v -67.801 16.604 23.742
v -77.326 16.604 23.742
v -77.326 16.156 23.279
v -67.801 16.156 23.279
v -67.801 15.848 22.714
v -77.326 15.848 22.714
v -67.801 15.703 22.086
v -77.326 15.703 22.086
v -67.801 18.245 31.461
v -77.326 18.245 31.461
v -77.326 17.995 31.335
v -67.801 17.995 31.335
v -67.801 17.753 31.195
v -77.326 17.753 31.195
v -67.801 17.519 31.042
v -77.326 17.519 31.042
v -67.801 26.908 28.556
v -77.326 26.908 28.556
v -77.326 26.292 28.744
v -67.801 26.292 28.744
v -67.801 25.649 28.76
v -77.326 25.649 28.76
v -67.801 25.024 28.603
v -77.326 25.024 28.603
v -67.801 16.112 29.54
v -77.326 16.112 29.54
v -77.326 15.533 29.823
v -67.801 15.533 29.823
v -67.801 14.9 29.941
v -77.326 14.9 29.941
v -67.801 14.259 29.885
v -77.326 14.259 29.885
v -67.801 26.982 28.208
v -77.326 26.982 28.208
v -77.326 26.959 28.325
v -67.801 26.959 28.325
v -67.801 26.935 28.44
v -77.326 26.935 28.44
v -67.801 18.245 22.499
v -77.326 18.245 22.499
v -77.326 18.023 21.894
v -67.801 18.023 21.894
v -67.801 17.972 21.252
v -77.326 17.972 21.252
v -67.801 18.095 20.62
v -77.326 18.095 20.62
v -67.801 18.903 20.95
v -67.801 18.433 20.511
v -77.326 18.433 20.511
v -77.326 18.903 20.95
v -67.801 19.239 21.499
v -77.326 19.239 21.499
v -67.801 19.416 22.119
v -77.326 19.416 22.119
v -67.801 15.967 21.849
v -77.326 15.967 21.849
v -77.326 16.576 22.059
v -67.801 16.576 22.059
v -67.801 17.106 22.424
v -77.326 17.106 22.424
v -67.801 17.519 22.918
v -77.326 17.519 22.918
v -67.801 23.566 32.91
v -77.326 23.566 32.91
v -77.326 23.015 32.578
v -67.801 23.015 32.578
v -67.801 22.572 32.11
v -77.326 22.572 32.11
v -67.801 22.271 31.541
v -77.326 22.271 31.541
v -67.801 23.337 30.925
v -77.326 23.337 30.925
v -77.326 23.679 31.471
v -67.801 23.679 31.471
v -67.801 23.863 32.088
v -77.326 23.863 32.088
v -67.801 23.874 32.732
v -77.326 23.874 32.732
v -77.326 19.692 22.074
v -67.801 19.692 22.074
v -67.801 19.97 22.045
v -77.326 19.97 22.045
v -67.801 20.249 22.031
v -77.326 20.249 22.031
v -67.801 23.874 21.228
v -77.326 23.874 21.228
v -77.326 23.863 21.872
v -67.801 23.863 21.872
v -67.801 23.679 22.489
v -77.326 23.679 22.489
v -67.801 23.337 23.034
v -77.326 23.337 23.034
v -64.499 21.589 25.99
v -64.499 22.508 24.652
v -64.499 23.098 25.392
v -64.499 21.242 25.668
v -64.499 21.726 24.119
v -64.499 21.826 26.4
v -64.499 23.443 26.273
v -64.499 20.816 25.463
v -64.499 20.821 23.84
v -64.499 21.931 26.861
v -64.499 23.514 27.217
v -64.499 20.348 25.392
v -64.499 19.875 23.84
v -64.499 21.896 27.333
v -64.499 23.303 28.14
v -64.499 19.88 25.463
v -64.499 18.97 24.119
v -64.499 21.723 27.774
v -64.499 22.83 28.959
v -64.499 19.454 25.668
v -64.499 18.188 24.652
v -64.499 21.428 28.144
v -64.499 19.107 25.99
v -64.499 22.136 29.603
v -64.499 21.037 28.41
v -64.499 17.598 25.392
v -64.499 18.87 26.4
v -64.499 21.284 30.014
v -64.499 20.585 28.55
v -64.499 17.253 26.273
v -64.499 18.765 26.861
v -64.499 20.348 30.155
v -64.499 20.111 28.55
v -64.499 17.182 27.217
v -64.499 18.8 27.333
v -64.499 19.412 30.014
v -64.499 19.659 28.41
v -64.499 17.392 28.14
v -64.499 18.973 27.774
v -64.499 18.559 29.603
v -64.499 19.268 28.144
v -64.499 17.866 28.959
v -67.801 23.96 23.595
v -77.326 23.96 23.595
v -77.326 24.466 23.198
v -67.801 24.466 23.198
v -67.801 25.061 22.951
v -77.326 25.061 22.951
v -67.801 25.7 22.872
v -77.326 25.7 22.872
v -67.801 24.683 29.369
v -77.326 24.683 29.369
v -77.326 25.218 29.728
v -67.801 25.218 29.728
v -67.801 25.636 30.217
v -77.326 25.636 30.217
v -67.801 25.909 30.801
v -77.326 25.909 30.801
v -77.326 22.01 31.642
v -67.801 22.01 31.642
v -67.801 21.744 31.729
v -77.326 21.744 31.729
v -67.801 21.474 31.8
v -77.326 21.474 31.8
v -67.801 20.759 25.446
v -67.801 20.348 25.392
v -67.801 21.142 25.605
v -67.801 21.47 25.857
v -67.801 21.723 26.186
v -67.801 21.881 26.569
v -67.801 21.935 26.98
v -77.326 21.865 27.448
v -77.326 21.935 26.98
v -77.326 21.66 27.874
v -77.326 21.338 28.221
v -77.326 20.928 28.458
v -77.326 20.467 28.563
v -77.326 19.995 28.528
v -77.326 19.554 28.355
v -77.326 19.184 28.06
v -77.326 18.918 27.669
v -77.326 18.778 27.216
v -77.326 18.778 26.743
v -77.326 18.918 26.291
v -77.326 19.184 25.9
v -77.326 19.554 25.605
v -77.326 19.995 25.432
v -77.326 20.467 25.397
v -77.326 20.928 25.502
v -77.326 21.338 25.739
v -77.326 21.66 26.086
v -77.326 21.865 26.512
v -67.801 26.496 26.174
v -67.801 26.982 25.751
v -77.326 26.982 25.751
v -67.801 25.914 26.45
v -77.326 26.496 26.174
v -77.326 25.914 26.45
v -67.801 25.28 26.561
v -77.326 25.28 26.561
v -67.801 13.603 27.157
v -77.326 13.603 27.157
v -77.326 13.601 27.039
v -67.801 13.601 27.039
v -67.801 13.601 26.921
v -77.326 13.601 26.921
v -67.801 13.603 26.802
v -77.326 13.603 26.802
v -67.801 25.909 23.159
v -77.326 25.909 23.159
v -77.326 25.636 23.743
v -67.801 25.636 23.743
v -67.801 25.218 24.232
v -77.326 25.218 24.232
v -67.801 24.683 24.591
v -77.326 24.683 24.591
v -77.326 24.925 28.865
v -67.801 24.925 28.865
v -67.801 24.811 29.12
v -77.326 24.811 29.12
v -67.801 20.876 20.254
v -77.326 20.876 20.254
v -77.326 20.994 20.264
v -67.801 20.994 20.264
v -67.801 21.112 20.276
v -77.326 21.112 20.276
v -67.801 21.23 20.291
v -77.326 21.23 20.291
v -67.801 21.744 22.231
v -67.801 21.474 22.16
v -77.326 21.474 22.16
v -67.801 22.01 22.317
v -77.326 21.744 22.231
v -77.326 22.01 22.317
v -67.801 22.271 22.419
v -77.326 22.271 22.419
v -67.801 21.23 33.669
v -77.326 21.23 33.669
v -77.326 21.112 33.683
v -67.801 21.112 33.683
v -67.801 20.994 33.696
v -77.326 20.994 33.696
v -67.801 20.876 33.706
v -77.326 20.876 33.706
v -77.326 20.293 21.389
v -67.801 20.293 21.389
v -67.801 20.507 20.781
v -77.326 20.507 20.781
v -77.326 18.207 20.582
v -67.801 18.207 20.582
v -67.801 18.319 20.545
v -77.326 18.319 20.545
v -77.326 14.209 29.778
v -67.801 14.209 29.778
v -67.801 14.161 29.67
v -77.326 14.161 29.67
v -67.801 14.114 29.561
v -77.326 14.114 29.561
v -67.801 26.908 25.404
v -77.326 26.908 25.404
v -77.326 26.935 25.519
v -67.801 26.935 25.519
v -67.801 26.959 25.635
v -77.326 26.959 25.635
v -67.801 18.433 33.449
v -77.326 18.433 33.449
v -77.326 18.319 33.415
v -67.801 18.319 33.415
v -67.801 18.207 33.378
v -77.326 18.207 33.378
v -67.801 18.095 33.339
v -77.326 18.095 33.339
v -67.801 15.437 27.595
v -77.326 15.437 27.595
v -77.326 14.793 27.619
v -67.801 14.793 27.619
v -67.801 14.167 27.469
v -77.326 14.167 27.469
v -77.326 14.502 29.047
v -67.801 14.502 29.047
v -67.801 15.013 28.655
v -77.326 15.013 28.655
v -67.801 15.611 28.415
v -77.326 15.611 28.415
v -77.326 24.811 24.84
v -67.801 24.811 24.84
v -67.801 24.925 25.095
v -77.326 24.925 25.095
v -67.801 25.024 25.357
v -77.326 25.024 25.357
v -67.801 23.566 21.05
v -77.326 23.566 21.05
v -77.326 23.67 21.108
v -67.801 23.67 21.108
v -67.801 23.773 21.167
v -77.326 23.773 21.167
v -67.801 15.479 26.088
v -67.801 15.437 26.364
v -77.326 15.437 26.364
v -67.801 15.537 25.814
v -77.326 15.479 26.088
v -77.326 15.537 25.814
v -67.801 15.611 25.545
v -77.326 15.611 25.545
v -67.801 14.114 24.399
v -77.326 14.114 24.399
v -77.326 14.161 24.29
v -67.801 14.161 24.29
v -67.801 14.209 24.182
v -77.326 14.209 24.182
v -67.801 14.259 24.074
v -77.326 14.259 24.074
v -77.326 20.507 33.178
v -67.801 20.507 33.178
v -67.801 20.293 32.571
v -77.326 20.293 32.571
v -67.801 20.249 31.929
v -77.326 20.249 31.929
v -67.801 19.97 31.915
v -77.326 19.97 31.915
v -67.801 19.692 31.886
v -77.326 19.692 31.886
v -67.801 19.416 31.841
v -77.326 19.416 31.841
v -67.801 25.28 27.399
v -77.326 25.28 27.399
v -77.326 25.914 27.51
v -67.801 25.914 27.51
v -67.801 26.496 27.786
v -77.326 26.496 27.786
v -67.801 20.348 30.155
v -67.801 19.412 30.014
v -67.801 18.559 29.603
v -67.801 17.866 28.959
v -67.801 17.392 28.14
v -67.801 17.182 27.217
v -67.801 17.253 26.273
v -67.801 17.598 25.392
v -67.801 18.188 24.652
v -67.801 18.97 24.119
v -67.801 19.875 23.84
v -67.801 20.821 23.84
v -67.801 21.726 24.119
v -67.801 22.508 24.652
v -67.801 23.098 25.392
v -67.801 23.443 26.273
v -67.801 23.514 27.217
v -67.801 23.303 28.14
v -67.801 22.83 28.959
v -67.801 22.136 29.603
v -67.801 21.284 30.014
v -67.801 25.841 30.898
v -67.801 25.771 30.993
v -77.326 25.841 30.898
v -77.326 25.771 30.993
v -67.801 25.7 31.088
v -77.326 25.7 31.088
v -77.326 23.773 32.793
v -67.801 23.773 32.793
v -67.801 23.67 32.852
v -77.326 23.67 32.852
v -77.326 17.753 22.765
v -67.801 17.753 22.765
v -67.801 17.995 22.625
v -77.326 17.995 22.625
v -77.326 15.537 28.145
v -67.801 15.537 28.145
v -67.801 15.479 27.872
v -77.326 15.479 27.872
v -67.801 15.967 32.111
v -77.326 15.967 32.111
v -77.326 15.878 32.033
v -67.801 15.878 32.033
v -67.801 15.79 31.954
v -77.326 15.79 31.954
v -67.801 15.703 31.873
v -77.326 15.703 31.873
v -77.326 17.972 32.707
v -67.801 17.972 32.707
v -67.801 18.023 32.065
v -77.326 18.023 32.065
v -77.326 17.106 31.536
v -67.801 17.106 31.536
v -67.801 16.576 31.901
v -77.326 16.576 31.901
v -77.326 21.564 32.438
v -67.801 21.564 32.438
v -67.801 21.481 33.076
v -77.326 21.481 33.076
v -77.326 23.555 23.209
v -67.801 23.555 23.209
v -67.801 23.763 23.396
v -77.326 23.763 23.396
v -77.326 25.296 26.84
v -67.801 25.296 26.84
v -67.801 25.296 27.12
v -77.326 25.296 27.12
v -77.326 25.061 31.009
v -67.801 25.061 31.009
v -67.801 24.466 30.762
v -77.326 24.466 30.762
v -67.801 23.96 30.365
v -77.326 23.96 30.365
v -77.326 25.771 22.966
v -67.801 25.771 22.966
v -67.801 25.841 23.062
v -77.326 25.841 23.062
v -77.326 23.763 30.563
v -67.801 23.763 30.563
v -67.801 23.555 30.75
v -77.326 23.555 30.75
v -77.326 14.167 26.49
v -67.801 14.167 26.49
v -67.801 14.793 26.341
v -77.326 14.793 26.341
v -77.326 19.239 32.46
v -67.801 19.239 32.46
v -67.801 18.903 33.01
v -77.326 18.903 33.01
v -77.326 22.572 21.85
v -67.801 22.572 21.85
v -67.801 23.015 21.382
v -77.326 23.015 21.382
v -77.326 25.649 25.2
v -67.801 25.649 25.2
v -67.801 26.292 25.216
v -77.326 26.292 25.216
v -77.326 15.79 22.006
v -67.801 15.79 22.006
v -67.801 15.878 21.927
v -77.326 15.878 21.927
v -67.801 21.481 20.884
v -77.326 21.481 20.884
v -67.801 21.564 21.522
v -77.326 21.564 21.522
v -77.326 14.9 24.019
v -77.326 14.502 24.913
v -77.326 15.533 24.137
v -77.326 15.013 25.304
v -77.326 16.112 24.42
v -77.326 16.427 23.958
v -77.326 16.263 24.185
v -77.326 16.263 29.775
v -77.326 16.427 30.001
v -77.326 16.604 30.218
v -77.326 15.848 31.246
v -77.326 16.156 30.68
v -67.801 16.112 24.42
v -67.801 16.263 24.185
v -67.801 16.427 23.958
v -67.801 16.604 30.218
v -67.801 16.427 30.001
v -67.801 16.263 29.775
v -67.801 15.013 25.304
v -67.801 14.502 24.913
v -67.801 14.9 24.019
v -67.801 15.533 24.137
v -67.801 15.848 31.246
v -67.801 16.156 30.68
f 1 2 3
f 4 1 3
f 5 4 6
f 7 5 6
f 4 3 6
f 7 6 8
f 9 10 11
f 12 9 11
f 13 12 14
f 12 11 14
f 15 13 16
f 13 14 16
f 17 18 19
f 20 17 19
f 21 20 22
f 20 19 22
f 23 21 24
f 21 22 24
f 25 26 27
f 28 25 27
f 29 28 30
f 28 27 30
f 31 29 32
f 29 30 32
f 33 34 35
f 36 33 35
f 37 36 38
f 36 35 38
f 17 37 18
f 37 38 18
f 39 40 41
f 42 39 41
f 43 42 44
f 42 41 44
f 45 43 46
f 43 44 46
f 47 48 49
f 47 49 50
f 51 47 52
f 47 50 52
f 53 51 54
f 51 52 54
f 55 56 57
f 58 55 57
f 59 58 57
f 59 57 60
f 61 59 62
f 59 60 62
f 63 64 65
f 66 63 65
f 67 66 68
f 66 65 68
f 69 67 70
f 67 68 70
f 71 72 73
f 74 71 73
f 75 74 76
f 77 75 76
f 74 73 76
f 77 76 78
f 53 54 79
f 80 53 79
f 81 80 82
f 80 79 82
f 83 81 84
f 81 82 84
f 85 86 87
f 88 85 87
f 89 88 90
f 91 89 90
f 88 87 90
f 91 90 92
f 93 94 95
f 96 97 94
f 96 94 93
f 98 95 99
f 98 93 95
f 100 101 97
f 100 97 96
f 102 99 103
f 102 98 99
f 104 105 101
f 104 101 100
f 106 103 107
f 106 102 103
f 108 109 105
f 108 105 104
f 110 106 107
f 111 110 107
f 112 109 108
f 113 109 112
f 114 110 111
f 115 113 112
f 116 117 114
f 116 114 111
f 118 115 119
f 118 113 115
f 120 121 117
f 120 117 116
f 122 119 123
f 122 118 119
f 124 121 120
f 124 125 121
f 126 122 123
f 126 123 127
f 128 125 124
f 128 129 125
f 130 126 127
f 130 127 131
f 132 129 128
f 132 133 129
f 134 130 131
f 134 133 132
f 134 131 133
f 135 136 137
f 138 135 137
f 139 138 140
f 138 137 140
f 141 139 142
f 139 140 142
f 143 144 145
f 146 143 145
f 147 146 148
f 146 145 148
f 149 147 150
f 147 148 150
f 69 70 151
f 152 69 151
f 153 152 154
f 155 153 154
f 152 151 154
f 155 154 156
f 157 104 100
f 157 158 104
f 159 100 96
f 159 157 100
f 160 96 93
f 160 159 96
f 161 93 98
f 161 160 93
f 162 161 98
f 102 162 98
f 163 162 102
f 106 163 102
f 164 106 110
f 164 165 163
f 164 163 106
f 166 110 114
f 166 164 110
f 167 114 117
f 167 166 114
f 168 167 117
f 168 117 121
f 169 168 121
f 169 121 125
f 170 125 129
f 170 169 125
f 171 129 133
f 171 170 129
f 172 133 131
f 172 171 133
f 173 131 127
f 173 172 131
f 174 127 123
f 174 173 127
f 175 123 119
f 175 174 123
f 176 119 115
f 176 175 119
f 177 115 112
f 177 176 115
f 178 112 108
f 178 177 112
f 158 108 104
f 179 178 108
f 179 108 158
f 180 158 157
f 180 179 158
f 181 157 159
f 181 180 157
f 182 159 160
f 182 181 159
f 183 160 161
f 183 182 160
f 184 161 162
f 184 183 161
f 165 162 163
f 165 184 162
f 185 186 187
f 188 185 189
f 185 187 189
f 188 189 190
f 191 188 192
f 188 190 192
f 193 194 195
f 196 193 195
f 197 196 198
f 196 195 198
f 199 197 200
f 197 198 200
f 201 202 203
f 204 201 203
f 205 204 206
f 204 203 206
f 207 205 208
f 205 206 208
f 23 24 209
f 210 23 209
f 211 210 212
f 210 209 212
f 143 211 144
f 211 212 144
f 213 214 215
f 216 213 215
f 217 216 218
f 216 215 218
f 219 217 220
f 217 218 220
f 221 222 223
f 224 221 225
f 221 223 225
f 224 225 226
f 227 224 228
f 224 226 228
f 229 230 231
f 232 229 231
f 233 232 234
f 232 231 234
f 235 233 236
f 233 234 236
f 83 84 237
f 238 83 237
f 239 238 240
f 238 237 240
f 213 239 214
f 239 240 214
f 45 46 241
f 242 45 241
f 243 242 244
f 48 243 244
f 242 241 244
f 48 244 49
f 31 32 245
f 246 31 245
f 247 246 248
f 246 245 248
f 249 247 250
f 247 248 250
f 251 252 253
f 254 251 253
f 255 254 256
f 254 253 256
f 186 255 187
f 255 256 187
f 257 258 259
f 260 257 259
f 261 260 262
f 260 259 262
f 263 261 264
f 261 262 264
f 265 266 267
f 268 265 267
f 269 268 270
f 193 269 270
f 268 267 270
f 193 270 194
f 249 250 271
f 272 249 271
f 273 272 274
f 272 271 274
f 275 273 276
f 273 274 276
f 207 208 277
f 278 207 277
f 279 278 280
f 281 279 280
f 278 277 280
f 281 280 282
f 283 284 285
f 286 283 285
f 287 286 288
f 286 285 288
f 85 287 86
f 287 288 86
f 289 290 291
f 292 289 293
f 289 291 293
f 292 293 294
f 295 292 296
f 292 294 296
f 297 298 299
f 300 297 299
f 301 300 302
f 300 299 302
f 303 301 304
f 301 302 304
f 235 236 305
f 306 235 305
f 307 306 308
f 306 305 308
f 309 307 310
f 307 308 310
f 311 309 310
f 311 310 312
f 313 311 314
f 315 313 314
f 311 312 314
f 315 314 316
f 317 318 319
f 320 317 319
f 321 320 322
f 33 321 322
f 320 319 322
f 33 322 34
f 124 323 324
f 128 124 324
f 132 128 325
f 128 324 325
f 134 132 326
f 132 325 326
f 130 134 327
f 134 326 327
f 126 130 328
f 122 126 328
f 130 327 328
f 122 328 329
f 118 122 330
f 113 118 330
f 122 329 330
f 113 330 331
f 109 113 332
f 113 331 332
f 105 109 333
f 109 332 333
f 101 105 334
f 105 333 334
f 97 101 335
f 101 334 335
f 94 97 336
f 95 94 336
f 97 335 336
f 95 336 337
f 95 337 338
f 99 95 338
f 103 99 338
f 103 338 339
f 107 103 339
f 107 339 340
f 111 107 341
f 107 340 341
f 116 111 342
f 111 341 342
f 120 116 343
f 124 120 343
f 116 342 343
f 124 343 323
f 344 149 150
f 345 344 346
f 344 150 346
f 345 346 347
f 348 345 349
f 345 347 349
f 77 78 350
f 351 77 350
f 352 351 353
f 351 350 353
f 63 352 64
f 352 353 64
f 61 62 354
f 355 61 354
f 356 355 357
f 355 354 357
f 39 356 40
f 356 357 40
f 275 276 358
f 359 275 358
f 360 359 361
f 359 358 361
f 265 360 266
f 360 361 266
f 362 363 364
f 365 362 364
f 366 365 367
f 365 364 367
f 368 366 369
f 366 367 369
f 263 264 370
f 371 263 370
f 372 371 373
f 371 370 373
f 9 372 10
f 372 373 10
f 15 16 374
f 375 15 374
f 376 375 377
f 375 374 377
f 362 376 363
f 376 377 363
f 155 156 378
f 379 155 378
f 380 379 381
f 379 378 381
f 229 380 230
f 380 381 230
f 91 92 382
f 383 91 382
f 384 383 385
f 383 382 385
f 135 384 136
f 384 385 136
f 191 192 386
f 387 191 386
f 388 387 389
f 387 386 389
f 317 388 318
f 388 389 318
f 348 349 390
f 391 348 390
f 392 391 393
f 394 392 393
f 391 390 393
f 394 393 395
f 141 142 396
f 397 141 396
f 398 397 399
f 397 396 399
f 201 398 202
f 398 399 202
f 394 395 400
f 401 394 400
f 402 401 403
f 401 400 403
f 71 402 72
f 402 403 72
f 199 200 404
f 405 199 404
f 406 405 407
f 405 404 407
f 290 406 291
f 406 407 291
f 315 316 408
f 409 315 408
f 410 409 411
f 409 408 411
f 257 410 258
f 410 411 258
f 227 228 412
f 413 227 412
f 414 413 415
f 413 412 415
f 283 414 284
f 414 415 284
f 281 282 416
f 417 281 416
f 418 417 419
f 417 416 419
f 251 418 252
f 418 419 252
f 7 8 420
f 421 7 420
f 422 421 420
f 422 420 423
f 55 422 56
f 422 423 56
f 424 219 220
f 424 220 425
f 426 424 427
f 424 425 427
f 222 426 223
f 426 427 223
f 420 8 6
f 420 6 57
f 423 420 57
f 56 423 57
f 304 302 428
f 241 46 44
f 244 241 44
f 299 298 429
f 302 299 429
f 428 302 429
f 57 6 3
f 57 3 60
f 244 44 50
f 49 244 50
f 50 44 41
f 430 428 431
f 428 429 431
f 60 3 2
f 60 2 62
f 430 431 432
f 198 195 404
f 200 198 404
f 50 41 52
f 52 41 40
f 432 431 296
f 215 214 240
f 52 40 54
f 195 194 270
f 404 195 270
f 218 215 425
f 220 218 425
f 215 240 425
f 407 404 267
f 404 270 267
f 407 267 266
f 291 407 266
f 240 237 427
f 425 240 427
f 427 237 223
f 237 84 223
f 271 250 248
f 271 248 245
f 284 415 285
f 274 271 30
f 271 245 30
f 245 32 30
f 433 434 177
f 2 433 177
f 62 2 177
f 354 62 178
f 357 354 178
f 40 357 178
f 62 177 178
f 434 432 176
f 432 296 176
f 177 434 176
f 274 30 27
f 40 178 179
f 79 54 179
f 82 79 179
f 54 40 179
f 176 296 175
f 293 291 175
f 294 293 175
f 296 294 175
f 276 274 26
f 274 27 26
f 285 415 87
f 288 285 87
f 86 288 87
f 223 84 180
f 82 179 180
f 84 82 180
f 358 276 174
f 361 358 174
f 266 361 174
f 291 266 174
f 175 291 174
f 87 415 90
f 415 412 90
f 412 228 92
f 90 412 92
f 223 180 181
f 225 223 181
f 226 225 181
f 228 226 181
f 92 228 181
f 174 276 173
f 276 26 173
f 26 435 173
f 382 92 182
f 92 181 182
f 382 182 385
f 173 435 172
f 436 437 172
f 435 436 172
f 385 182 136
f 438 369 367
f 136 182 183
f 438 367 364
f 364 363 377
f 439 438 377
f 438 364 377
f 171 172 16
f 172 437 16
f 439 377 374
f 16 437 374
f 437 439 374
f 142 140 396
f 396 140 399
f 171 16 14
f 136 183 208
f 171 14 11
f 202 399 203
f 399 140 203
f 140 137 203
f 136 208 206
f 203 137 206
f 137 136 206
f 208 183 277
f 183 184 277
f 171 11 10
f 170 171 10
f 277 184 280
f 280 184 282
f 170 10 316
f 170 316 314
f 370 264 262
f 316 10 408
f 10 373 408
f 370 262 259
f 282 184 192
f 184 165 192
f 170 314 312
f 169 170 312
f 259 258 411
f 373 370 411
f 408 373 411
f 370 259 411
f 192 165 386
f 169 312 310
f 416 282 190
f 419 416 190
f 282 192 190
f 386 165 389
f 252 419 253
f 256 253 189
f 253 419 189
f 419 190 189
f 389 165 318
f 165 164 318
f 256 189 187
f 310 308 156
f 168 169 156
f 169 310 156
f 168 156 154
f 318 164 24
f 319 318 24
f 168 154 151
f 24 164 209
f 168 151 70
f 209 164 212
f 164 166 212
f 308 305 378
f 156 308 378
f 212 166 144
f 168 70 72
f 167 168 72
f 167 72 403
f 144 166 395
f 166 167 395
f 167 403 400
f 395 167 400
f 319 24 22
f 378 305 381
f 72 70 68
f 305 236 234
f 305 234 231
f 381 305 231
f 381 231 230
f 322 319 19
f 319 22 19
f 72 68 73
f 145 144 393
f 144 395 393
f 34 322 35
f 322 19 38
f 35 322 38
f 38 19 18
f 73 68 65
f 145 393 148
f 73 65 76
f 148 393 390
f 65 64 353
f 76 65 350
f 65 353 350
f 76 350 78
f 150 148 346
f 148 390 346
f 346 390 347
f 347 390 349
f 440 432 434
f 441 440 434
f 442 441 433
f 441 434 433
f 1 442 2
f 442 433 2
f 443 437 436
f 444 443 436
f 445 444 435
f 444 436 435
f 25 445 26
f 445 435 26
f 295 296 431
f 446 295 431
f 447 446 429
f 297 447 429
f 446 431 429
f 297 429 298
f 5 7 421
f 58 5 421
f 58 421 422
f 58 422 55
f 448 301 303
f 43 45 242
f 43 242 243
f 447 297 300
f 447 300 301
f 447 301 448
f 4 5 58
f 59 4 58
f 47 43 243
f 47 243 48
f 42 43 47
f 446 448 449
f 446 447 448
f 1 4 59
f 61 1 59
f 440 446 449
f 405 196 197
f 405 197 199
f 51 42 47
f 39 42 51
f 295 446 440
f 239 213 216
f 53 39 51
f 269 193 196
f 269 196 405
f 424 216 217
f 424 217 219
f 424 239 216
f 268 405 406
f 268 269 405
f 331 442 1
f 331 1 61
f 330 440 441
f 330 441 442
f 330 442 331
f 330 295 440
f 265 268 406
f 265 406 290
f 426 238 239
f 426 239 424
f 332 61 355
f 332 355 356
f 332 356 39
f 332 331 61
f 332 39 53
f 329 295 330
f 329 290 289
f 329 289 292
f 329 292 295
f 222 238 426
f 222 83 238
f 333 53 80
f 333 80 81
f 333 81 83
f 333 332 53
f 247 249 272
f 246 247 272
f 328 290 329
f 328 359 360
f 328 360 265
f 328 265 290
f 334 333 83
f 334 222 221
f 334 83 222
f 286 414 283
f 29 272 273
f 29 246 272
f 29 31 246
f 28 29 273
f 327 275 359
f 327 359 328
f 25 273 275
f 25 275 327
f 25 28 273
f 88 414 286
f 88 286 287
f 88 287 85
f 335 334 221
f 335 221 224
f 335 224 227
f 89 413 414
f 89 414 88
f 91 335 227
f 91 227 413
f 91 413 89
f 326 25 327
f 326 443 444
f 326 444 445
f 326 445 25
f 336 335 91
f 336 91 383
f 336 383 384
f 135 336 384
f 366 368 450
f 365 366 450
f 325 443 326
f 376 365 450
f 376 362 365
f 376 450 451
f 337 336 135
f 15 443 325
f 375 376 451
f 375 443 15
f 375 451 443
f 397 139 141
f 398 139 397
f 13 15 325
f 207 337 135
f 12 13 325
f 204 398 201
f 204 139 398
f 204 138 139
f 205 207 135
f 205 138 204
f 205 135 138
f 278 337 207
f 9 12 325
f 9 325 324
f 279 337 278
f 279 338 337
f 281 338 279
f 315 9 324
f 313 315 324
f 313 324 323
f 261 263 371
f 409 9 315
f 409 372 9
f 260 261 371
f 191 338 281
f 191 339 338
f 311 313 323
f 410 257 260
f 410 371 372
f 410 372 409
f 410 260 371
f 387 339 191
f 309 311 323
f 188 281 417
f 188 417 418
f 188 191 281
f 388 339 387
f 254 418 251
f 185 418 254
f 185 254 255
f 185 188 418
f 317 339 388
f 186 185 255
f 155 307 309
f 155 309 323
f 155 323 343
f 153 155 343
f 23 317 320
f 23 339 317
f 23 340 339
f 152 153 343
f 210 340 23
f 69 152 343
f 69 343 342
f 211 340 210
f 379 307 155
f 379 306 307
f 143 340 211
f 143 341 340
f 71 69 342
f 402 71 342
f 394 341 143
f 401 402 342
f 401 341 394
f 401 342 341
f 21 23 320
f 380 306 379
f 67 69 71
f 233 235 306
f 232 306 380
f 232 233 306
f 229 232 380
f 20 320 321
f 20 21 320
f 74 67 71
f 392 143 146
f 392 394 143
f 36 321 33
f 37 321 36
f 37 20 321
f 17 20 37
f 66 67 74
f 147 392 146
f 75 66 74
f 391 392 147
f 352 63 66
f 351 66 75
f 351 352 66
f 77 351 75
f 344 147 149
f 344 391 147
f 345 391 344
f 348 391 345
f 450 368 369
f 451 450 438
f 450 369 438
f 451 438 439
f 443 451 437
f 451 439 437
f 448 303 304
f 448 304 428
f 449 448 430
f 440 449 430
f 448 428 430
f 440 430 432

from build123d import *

# Parameters (mm, degrees)
SPUR_START             = -77.326171545
SPUR_GEAR_AI_OUTLINE_R = 1.5875
SPUR_GEAR_AI_DEPTH     = 9.525
SKETCH1_R              = 3.175
SKETCH1_R_2            = 1.5875
BOSS_EXTRUDE1_DEPTH    = 3.302


# Read off the part's stored shape, not the designer's step: spur gear_ai
with BuildPart() as part:
    # spur gear_ai outline → spur gear_ai (new body)
    with BuildSketch(Plane.YZ.offset(SPUR_START)):
        with BuildLine():
            ThreePointArc((25.700043696, 22.871890839), (25.806291245, 23.014153087), (25.908758385, 23.159161964))
            ThreePointArc((25.908758385, 23.159161964), (25.44365934, 24.001503635), (24.683177407, 24.591015164))
            ThreePointArc((24.683177407, 24.591015164), (24.869844856, 24.966591507), (25.024047568, 25.356622082))
            ThreePointArc((25.024047568, 25.356622082), (25.971001747, 25.185934076), (26.908195608, 25.40393472))
            ThreePointArc((26.908195608, 25.40393472), (26.947394305, 25.577112523), (26.982022272, 25.751261864))
            ThreePointArc((26.982022272, 25.751261864), (26.214521927, 26.331606447), (25.280011171, 26.560836158))
            ThreePointArc((25.280011171, 26.560836158), (25.297779711, 26.979866711), (25.280011171, 27.398897265))
            ThreePointArc((25.280011171, 27.398897265), (26.214521927, 27.628126976), (26.982022272, 28.208471559))
            ThreePointArc((26.982022272, 28.208471559), (26.947394305, 28.3826209), (26.908195608, 28.555798703))
            ThreePointArc((26.908195608, 28.555798703), (25.971001747, 28.773799347), (25.024047568, 28.60311134))
            ThreePointArc((25.024047568, 28.60311134), (24.869844856, 28.993141915), (24.683177407, 29.368718258))
            ThreePointArc((24.683177407, 29.368718258), (25.44365934, 29.958229787), (25.908758385, 30.800571458))
            ThreePointArc((25.908758385, 30.800571458), (25.806291245, 30.945580335), (25.700043696, 31.087842584))
            ThreePointArc((25.700043696, 31.087842584), (24.755205651, 30.905804997), (23.959545029, 30.36471278))
            ThreePointArc((23.959545029, 30.36471278), (23.660034115, 30.658303547), (23.336744253, 30.925485117))
            ThreePointArc((23.336744253, 30.925485117), (23.791703129, 31.773346565), (23.873981026, 32.732036797))
            ThreePointArc((23.873981026, 32.732036797), (23.721392211, 32.822831857), (23.566466975, 32.909580117))
            ThreePointArc((23.566466975, 32.909580117), (22.777355829, 32.358980252), (22.270565713, 31.541043584))
            ThreePointArc((22.270565713, 31.541043584), (21.877534755, 31.687430032), (21.473522236, 31.800018709))
            ThreePointArc((21.473522236, 31.800018709), (21.544291531, 32.759627129), (21.229521683, 33.668899671))
            ThreePointArc((21.229521683, 33.668899671), (21.053195187, 33.689781624), (20.876380246, 33.706016332))
            ThreePointArc((20.876380246, 33.706016332), (20.379440483, 32.882057908), (20.249149489, 31.92870547))
            ThreePointArc((20.249149489, 31.92870547), (19.83055711, 31.902576052), (19.415679368, 31.84110423))
            ThreePointArc((19.415679368, 31.84110423), (19.090022428, 32.746534609), (18.432631403, 33.449167979))
            ThreePointArc((18.432631403, 33.449167979), (18.263055677, 33.396526145), (18.09492394, 33.339440173))
            ThreePointArc((18.09492394, 33.339440173), (17.976080961, 32.384593086), (18.244817586, 31.460668176))
            ThreePointArc((18.244817586, 31.460668176), (17.873042211, 31.266540906), (17.519035377, 31.041637622))
            ThreePointArc((17.519035377, 31.041637622), (16.853261246, 31.736332821), (15.966917922, 32.110835325))
            ThreePointArc((15.966917922, 32.110835325), (15.833414151, 31.993771955), (15.703037123, 31.873235987))
            ThreePointArc((15.703037123, 31.873235987), (15.982839958, 30.952601973), (16.604137198, 30.217859601))
            ThreePointArc((16.604137198, 30.217859601), (16.343462167, 29.889300848), (16.111537238, 29.539853923))
            ThreePointArc((16.111537238, 29.539853923), (15.220764312, 29.903694832), (14.258725503, 29.885311585))
            ThreePointArc((14.258725503, 29.885311585), (14.184377702, 29.724068), (14.114298755, 29.560923799))
            ThreePointArc((14.114298755, 29.560923799), (14.744366952, 28.833688843), (15.610796869, 28.41517264))
            ThreePointArc((15.610796869, 28.41517264), (15.506295264, 28.008993196), (15.436554167, 27.595425178))
            ThreePointArc((15.436554167, 27.595425178), (14.474805177, 27.565500398), (13.603416133, 27.157410031))
            ThreePointArc((13.603416133, 27.157410031), (13.601079711, 26.979866712), (13.603416133, 26.802323392))
            ThreePointArc((13.603416133, 26.802323392), (14.474805177, 26.394233025), (15.436554167, 26.364308244))
            ThreePointArc((15.436554167, 26.364308244), (15.506295264, 25.950740226), (15.610796869, 25.544560783))
            ThreePointArc((15.610796869, 25.544560783), (14.744366952, 25.12604458), (14.114298755, 24.398809624))
            ThreePointArc((14.114298755, 24.398809624), (14.184377702, 24.235665423), (14.258725503, 24.074421838))
            ThreePointArc((14.258725503, 24.074421838), (15.220764312, 24.056038591), (16.111537238, 24.4198795))
            ThreePointArc((16.111537238, 24.4198795), (16.343462167, 24.070432575), (16.604137198, 23.741873821))
            ThreePointArc((16.604137198, 23.741873821), (15.982839958, 23.007131449), (15.703037123, 22.086497436))
            ThreePointArc((15.703037123, 22.086497436), (15.833414152, 21.965961467), (15.966917922, 21.848898097))
            ThreePointArc((15.966917922, 21.848898097), (16.853261246, 22.223400602), (17.519035377, 22.918095801))
            ThreePointArc((17.519035377, 22.918095801), (17.873042211, 22.693192517), (18.244817586, 22.499065247))
            ThreePointArc((18.244817586, 22.499065247), (17.976080961, 21.575140337), (18.09492394, 20.62029325))
            ThreePointArc((18.09492394, 20.62029325), (18.263055677, 20.563207278), (18.432631403, 20.510565444))
            ThreePointArc((18.432631403, 20.510565444), (19.090022428, 21.213198814), (19.415679368, 22.118629192))
            ThreePointArc((19.415679368, 22.118629192), (19.83055711, 22.057157371), (20.249149489, 22.031027953))
            ThreePointArc((20.249149489, 22.031027953), (20.379440483, 21.077675515), (20.876380246, 20.253717091))
            ThreePointArc((20.876380246, 20.253717091), (21.053195187, 20.269951799), (21.229521683, 20.290833751))
            ThreePointArc((21.229521683, 20.290833751), (21.544291531, 21.200106294), (21.473522236, 22.159714714))
            ThreePointArc((21.473522236, 22.159714714), (21.877534755, 22.272303391), (22.270565713, 22.418689838))
            ThreePointArc((22.270565713, 22.418689838), (22.777355829, 21.600753171), (23.566466975, 21.050153306))
            ThreePointArc((23.566466975, 21.050153306), (23.721392211, 21.136901565), (23.873981026, 21.227696625))
            ThreePointArc((23.873981026, 21.227696625), (23.791703129, 22.186386858), (23.336744253, 23.034248306))
            ThreePointArc((23.336744253, 23.034248306), (23.660034115, 23.301429876), (23.959545029, 23.595020643))
            ThreePointArc((23.959545029, 23.595020643), (24.755205651, 23.053928425), (25.700043696, 22.871890839))
        make_face()
        with Locations((20.347954711, 26.979866711)):
            Circle(SPUR_GEAR_AI_OUTLINE_R, mode=Mode.SUBTRACT)
    extrude(amount=SPUR_GEAR_AI_DEPTH)

    # Sketch1 → Boss-Extrude1 (add)
    with BuildSketch(Plane(origin=(-67.801171545, 0, 0), x_dir=(0, 0, -1), z_dir=(1, 0, 0))):
        with Locations(Location((-26.979866711, 20.347954711, 0), (0, 0, 180))):
            Circle(SKETCH1_R)
        with Locations((-26.979866711, 20.347954711)):
            Circle(SKETCH1_R_2, mode=Mode.SUBTRACT)
    extrude(amount=BOSS_EXTRUDE1_DEPTH)


solid = part.part
